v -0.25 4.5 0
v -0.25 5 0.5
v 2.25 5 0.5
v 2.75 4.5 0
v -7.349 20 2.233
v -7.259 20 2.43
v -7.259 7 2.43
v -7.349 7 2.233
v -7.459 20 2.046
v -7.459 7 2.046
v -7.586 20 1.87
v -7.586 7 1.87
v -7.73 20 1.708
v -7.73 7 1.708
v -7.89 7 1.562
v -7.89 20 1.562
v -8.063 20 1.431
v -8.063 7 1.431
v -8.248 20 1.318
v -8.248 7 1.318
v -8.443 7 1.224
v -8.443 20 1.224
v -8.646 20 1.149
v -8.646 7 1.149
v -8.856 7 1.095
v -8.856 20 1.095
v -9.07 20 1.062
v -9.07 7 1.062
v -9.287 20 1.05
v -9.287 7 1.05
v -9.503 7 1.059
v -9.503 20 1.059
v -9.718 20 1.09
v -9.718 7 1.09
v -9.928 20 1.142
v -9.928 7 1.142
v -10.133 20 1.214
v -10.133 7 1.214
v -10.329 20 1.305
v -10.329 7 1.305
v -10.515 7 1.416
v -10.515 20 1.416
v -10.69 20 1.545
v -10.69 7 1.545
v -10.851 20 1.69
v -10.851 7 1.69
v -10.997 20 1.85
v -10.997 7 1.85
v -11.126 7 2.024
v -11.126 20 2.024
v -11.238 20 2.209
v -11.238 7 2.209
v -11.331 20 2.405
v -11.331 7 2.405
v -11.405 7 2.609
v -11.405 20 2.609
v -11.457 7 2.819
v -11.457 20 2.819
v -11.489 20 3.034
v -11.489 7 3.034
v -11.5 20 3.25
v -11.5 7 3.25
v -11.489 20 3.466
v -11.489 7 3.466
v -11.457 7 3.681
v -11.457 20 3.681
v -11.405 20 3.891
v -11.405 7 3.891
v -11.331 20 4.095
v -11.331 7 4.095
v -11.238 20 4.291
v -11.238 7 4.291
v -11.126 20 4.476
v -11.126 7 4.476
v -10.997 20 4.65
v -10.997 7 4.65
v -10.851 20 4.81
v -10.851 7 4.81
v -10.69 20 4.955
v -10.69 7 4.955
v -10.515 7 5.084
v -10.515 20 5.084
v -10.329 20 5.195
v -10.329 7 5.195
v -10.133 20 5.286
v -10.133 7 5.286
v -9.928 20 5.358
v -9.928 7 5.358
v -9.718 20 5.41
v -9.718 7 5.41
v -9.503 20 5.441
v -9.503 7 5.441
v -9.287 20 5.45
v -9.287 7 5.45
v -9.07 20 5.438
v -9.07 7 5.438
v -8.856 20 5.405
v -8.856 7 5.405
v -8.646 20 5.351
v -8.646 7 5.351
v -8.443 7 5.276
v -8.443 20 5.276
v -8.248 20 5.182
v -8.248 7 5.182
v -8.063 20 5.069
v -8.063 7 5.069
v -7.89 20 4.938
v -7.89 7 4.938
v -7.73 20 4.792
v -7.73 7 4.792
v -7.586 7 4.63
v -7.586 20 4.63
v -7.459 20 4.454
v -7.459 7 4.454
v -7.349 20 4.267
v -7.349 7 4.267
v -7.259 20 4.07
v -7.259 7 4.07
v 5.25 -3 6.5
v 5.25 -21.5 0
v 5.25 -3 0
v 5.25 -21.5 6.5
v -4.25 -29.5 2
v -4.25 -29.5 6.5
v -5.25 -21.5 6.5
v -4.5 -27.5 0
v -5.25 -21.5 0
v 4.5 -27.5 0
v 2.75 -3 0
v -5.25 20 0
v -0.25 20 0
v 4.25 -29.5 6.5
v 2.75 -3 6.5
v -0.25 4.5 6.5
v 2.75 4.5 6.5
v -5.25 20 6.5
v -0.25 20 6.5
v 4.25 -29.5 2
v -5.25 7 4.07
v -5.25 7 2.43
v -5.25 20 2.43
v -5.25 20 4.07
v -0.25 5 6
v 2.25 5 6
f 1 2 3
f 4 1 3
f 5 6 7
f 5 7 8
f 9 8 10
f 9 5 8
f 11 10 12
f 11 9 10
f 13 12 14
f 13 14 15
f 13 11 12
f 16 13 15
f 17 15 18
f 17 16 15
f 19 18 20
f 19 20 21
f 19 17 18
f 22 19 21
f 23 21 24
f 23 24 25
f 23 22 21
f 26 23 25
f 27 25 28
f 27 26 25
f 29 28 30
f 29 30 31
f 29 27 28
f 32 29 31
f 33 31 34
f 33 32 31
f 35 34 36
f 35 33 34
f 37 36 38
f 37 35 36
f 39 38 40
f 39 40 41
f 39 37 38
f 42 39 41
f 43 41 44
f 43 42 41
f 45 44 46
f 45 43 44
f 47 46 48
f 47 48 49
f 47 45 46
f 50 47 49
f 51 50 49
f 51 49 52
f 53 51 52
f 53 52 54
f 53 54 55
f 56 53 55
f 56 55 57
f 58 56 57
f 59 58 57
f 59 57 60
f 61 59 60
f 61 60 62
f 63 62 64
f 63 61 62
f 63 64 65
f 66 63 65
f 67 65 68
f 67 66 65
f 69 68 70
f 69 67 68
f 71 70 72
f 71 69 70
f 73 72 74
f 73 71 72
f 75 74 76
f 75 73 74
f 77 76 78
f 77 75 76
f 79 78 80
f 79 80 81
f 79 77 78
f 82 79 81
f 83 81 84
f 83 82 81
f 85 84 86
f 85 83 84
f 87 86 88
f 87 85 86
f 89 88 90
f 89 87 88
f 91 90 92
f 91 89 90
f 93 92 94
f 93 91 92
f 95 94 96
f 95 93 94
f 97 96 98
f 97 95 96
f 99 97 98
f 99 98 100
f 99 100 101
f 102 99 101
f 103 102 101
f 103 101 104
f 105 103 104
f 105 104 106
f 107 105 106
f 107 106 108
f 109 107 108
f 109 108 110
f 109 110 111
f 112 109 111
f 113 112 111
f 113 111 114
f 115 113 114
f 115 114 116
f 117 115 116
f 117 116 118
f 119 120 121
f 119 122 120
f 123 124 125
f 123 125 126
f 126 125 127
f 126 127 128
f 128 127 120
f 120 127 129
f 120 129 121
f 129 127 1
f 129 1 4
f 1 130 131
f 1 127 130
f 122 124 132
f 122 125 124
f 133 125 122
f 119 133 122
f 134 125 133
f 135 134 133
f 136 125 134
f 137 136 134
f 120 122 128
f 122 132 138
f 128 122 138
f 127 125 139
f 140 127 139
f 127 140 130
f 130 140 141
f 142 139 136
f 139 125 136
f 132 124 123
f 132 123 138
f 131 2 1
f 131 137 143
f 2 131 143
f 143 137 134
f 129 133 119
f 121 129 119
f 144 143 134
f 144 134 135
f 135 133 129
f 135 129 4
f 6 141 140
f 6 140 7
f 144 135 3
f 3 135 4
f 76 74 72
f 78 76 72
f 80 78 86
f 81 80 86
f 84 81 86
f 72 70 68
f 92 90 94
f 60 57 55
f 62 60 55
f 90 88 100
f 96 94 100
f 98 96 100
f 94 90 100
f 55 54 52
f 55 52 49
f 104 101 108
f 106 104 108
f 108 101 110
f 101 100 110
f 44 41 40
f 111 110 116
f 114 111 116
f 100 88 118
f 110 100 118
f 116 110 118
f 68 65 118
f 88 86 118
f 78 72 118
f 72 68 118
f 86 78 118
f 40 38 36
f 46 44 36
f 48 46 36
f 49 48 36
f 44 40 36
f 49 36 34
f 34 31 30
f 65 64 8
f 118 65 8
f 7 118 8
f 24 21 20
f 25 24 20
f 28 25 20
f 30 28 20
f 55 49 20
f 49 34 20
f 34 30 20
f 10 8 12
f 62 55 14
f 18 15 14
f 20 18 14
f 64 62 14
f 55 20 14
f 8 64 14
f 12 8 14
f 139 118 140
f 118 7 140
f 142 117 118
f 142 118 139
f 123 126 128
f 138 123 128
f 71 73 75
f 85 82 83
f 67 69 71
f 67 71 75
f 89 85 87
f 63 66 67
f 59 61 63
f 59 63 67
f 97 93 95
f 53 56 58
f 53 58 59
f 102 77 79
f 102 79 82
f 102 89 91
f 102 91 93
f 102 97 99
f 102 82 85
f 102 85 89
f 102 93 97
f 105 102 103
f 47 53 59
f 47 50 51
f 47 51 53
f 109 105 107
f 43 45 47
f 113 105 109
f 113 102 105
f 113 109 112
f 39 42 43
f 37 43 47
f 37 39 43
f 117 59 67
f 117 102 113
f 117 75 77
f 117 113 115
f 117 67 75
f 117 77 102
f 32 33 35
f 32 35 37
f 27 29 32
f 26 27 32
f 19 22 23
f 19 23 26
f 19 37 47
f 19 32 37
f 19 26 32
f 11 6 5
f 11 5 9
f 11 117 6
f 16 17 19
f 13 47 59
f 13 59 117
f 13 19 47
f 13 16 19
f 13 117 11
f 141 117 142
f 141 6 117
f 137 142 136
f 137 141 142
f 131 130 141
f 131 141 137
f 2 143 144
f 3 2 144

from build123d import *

# Parameters (mm, degrees)
SZKIC1_W                    = 10.5
SZKIC1_H                    = 40
DODANIE_WYCI_GNI_CIE1_DEPTH = 6.5
SZKIC2_W                    = 2.5
SZKIC2_H                    = 8
WYTNIJ_WYCI_GNI_CIE1_DEPTH  = 6.5
SFAZOWANIE1_SIZE            = 0.5
DODANIE_WYCI_GNI_CIE2_DEPTH = 13
SZKIC4_W                    = 10.5
SZKIC4_H                    = 9.5
DODANIE_WYCI_GNI_CIE3_DEPTH = 6.5
SFAZOWANIE2_SIZE            = 8
SFAZOWANIE2_SIZE2           = 1
SFAZOWANIE3_SIZE            = 1
SFAZOWANIE3_SIZE2           = 8
SFAZOWANIE4_SIZE            = 2


with BuildPart() as part:
    # Szkic1 → Dodanie-wyciągnięcie1 (new body)
    with BuildSketch(Plane.XY):
        Rectangle(SZKIC1_W, SZKIC1_H)
    extrude(amount=DODANIE_WYCI_GNI_CIE1_DEPTH)

    # Szkic2 → Wytnij-wyciągnięcie1 (cut)
    with BuildSketch(Plane.XY.offset(6.5)):
        with Locations((4, 1)):
            Rectangle(SZKIC2_W, SZKIC2_H)
        Polygon((5.25, 20), (-0.25, 20), (-0.25, 5), (2.75, 5), (5.25, 5), align=None)
    extrude(amount=-WYTNIJ_WYCI_GNI_CIE1_DEPTH, mode=Mode.SUBTRACT)

    # Sfazowanie1
    sfazowanie1_edges = [part.edges().sort_by_distance(p)[0] for p in [
        (1.25, 5, 0),
        (2.75, 5, 3.25),
        (1.25, 5, 6.5),
    ]]
    chamfer(sfazowanie1_edges, length=SFAZOWANIE1_SIZE)

    # Szkic3 → Dodanie-wyciągnięcie2 (add)
    with BuildSketch(Plane(origin=(0, 20, 0), x_dir=(1, 0, 0), z_dir=(0, 1, 0))):
        with BuildLine():
            ThreePointArc((-7.258694583, -2.429590228), (-11.5, -3.25), (-7.258694583, -4.070409772))
            Line((-7.258694583, -4.070409772), (-9.3, -4.070409772))
            Line((-9.3, -4.070409772), (-9.3, -2.429590228))
            Line((-9.3, -2.429590228), (-7.258694583, -2.429590228))
        make_face()
        with BuildLine():
            Line((-9.3, -4.070409772), (-7.258694583, -4.070409772))
            ThreePointArc((-7.258694583, -4.070409772), (-7.140037973, -3.667808618), (-7.1, -3.25))
            ThreePointArc((-7.1, -3.25), (-7.140037973, -2.832191382), (-7.258694583, -2.429590228))
            Line((-7.258694583, -2.429590228), (-9.3, -2.429590228))
            Line((-9.3, -2.429590228), (-9.3, -4.070409772))
        make_face()
        with BuildLine():
            Line((-7.258694583, -4.070409772), (-5.25, -4.070409772))
            Line((-5.25, -4.070409772), (-5.25, -2.429590228))
            Line((-5.25, -2.429590228), (-7.258694583, -2.429590228))
            ThreePointArc((-7.258694583, -2.429590228), (-7.140037973, -2.832191382), (-7.1, -3.25))
            ThreePointArc((-7.1, -3.25), (-7.140037973, -3.667808618), (-7.258694583, -4.070409772))
        make_face()
    extrude(amount=-DODANIE_WYCI_GNI_CIE2_DEPTH)

    # Szkic4 → Dodanie-wyciągnięcie3 (add)
    with BuildSketch(Plane.XY.offset(6.5)):
        with Locations((0, -24.75)):
            Rectangle(SZKIC4_W, SZKIC4_H)
    extrude(amount=-DODANIE_WYCI_GNI_CIE3_DEPTH)

    # Sfazowanie2
    sfazowanie2_edges = [part.edges().sort_by_distance(p)[0] for p in [
        (5.25, -29.5, 3.25),
    ]]
    sfazowanie2_side = [part.faces().sort_by_distance(p)[0] for p in [
        (5.25, -16.25, 3.25),
    ]]
    chamfer(sfazowanie2_edges, length=SFAZOWANIE2_SIZE, length2=SFAZOWANIE2_SIZE2, reference=sfazowanie2_side[0])

    # Sfazowanie3
    sfazowanie3_edges = [part.edges().sort_by_distance(p)[0] for p in [
        (-5.25, -29.5, 3.25),
    ]]
    sfazowanie3_side = [part.faces().sort_by_distance(p)[0] for p in [
        (-0.5, -29.5, 3.25),
    ]]
    chamfer(sfazowanie3_edges, length=SFAZOWANIE3_SIZE, length2=SFAZOWANIE3_SIZE2, reference=sfazowanie3_side[0])

    # Sfazowanie4
    sfazowanie4_edges = [part.edges().sort_by_distance(p)[0] for p in [
        (0, -29.5, 0),
    ]]
    chamfer(sfazowanie4_edges, length=SFAZOWANIE4_SIZE)


solid = part.part
